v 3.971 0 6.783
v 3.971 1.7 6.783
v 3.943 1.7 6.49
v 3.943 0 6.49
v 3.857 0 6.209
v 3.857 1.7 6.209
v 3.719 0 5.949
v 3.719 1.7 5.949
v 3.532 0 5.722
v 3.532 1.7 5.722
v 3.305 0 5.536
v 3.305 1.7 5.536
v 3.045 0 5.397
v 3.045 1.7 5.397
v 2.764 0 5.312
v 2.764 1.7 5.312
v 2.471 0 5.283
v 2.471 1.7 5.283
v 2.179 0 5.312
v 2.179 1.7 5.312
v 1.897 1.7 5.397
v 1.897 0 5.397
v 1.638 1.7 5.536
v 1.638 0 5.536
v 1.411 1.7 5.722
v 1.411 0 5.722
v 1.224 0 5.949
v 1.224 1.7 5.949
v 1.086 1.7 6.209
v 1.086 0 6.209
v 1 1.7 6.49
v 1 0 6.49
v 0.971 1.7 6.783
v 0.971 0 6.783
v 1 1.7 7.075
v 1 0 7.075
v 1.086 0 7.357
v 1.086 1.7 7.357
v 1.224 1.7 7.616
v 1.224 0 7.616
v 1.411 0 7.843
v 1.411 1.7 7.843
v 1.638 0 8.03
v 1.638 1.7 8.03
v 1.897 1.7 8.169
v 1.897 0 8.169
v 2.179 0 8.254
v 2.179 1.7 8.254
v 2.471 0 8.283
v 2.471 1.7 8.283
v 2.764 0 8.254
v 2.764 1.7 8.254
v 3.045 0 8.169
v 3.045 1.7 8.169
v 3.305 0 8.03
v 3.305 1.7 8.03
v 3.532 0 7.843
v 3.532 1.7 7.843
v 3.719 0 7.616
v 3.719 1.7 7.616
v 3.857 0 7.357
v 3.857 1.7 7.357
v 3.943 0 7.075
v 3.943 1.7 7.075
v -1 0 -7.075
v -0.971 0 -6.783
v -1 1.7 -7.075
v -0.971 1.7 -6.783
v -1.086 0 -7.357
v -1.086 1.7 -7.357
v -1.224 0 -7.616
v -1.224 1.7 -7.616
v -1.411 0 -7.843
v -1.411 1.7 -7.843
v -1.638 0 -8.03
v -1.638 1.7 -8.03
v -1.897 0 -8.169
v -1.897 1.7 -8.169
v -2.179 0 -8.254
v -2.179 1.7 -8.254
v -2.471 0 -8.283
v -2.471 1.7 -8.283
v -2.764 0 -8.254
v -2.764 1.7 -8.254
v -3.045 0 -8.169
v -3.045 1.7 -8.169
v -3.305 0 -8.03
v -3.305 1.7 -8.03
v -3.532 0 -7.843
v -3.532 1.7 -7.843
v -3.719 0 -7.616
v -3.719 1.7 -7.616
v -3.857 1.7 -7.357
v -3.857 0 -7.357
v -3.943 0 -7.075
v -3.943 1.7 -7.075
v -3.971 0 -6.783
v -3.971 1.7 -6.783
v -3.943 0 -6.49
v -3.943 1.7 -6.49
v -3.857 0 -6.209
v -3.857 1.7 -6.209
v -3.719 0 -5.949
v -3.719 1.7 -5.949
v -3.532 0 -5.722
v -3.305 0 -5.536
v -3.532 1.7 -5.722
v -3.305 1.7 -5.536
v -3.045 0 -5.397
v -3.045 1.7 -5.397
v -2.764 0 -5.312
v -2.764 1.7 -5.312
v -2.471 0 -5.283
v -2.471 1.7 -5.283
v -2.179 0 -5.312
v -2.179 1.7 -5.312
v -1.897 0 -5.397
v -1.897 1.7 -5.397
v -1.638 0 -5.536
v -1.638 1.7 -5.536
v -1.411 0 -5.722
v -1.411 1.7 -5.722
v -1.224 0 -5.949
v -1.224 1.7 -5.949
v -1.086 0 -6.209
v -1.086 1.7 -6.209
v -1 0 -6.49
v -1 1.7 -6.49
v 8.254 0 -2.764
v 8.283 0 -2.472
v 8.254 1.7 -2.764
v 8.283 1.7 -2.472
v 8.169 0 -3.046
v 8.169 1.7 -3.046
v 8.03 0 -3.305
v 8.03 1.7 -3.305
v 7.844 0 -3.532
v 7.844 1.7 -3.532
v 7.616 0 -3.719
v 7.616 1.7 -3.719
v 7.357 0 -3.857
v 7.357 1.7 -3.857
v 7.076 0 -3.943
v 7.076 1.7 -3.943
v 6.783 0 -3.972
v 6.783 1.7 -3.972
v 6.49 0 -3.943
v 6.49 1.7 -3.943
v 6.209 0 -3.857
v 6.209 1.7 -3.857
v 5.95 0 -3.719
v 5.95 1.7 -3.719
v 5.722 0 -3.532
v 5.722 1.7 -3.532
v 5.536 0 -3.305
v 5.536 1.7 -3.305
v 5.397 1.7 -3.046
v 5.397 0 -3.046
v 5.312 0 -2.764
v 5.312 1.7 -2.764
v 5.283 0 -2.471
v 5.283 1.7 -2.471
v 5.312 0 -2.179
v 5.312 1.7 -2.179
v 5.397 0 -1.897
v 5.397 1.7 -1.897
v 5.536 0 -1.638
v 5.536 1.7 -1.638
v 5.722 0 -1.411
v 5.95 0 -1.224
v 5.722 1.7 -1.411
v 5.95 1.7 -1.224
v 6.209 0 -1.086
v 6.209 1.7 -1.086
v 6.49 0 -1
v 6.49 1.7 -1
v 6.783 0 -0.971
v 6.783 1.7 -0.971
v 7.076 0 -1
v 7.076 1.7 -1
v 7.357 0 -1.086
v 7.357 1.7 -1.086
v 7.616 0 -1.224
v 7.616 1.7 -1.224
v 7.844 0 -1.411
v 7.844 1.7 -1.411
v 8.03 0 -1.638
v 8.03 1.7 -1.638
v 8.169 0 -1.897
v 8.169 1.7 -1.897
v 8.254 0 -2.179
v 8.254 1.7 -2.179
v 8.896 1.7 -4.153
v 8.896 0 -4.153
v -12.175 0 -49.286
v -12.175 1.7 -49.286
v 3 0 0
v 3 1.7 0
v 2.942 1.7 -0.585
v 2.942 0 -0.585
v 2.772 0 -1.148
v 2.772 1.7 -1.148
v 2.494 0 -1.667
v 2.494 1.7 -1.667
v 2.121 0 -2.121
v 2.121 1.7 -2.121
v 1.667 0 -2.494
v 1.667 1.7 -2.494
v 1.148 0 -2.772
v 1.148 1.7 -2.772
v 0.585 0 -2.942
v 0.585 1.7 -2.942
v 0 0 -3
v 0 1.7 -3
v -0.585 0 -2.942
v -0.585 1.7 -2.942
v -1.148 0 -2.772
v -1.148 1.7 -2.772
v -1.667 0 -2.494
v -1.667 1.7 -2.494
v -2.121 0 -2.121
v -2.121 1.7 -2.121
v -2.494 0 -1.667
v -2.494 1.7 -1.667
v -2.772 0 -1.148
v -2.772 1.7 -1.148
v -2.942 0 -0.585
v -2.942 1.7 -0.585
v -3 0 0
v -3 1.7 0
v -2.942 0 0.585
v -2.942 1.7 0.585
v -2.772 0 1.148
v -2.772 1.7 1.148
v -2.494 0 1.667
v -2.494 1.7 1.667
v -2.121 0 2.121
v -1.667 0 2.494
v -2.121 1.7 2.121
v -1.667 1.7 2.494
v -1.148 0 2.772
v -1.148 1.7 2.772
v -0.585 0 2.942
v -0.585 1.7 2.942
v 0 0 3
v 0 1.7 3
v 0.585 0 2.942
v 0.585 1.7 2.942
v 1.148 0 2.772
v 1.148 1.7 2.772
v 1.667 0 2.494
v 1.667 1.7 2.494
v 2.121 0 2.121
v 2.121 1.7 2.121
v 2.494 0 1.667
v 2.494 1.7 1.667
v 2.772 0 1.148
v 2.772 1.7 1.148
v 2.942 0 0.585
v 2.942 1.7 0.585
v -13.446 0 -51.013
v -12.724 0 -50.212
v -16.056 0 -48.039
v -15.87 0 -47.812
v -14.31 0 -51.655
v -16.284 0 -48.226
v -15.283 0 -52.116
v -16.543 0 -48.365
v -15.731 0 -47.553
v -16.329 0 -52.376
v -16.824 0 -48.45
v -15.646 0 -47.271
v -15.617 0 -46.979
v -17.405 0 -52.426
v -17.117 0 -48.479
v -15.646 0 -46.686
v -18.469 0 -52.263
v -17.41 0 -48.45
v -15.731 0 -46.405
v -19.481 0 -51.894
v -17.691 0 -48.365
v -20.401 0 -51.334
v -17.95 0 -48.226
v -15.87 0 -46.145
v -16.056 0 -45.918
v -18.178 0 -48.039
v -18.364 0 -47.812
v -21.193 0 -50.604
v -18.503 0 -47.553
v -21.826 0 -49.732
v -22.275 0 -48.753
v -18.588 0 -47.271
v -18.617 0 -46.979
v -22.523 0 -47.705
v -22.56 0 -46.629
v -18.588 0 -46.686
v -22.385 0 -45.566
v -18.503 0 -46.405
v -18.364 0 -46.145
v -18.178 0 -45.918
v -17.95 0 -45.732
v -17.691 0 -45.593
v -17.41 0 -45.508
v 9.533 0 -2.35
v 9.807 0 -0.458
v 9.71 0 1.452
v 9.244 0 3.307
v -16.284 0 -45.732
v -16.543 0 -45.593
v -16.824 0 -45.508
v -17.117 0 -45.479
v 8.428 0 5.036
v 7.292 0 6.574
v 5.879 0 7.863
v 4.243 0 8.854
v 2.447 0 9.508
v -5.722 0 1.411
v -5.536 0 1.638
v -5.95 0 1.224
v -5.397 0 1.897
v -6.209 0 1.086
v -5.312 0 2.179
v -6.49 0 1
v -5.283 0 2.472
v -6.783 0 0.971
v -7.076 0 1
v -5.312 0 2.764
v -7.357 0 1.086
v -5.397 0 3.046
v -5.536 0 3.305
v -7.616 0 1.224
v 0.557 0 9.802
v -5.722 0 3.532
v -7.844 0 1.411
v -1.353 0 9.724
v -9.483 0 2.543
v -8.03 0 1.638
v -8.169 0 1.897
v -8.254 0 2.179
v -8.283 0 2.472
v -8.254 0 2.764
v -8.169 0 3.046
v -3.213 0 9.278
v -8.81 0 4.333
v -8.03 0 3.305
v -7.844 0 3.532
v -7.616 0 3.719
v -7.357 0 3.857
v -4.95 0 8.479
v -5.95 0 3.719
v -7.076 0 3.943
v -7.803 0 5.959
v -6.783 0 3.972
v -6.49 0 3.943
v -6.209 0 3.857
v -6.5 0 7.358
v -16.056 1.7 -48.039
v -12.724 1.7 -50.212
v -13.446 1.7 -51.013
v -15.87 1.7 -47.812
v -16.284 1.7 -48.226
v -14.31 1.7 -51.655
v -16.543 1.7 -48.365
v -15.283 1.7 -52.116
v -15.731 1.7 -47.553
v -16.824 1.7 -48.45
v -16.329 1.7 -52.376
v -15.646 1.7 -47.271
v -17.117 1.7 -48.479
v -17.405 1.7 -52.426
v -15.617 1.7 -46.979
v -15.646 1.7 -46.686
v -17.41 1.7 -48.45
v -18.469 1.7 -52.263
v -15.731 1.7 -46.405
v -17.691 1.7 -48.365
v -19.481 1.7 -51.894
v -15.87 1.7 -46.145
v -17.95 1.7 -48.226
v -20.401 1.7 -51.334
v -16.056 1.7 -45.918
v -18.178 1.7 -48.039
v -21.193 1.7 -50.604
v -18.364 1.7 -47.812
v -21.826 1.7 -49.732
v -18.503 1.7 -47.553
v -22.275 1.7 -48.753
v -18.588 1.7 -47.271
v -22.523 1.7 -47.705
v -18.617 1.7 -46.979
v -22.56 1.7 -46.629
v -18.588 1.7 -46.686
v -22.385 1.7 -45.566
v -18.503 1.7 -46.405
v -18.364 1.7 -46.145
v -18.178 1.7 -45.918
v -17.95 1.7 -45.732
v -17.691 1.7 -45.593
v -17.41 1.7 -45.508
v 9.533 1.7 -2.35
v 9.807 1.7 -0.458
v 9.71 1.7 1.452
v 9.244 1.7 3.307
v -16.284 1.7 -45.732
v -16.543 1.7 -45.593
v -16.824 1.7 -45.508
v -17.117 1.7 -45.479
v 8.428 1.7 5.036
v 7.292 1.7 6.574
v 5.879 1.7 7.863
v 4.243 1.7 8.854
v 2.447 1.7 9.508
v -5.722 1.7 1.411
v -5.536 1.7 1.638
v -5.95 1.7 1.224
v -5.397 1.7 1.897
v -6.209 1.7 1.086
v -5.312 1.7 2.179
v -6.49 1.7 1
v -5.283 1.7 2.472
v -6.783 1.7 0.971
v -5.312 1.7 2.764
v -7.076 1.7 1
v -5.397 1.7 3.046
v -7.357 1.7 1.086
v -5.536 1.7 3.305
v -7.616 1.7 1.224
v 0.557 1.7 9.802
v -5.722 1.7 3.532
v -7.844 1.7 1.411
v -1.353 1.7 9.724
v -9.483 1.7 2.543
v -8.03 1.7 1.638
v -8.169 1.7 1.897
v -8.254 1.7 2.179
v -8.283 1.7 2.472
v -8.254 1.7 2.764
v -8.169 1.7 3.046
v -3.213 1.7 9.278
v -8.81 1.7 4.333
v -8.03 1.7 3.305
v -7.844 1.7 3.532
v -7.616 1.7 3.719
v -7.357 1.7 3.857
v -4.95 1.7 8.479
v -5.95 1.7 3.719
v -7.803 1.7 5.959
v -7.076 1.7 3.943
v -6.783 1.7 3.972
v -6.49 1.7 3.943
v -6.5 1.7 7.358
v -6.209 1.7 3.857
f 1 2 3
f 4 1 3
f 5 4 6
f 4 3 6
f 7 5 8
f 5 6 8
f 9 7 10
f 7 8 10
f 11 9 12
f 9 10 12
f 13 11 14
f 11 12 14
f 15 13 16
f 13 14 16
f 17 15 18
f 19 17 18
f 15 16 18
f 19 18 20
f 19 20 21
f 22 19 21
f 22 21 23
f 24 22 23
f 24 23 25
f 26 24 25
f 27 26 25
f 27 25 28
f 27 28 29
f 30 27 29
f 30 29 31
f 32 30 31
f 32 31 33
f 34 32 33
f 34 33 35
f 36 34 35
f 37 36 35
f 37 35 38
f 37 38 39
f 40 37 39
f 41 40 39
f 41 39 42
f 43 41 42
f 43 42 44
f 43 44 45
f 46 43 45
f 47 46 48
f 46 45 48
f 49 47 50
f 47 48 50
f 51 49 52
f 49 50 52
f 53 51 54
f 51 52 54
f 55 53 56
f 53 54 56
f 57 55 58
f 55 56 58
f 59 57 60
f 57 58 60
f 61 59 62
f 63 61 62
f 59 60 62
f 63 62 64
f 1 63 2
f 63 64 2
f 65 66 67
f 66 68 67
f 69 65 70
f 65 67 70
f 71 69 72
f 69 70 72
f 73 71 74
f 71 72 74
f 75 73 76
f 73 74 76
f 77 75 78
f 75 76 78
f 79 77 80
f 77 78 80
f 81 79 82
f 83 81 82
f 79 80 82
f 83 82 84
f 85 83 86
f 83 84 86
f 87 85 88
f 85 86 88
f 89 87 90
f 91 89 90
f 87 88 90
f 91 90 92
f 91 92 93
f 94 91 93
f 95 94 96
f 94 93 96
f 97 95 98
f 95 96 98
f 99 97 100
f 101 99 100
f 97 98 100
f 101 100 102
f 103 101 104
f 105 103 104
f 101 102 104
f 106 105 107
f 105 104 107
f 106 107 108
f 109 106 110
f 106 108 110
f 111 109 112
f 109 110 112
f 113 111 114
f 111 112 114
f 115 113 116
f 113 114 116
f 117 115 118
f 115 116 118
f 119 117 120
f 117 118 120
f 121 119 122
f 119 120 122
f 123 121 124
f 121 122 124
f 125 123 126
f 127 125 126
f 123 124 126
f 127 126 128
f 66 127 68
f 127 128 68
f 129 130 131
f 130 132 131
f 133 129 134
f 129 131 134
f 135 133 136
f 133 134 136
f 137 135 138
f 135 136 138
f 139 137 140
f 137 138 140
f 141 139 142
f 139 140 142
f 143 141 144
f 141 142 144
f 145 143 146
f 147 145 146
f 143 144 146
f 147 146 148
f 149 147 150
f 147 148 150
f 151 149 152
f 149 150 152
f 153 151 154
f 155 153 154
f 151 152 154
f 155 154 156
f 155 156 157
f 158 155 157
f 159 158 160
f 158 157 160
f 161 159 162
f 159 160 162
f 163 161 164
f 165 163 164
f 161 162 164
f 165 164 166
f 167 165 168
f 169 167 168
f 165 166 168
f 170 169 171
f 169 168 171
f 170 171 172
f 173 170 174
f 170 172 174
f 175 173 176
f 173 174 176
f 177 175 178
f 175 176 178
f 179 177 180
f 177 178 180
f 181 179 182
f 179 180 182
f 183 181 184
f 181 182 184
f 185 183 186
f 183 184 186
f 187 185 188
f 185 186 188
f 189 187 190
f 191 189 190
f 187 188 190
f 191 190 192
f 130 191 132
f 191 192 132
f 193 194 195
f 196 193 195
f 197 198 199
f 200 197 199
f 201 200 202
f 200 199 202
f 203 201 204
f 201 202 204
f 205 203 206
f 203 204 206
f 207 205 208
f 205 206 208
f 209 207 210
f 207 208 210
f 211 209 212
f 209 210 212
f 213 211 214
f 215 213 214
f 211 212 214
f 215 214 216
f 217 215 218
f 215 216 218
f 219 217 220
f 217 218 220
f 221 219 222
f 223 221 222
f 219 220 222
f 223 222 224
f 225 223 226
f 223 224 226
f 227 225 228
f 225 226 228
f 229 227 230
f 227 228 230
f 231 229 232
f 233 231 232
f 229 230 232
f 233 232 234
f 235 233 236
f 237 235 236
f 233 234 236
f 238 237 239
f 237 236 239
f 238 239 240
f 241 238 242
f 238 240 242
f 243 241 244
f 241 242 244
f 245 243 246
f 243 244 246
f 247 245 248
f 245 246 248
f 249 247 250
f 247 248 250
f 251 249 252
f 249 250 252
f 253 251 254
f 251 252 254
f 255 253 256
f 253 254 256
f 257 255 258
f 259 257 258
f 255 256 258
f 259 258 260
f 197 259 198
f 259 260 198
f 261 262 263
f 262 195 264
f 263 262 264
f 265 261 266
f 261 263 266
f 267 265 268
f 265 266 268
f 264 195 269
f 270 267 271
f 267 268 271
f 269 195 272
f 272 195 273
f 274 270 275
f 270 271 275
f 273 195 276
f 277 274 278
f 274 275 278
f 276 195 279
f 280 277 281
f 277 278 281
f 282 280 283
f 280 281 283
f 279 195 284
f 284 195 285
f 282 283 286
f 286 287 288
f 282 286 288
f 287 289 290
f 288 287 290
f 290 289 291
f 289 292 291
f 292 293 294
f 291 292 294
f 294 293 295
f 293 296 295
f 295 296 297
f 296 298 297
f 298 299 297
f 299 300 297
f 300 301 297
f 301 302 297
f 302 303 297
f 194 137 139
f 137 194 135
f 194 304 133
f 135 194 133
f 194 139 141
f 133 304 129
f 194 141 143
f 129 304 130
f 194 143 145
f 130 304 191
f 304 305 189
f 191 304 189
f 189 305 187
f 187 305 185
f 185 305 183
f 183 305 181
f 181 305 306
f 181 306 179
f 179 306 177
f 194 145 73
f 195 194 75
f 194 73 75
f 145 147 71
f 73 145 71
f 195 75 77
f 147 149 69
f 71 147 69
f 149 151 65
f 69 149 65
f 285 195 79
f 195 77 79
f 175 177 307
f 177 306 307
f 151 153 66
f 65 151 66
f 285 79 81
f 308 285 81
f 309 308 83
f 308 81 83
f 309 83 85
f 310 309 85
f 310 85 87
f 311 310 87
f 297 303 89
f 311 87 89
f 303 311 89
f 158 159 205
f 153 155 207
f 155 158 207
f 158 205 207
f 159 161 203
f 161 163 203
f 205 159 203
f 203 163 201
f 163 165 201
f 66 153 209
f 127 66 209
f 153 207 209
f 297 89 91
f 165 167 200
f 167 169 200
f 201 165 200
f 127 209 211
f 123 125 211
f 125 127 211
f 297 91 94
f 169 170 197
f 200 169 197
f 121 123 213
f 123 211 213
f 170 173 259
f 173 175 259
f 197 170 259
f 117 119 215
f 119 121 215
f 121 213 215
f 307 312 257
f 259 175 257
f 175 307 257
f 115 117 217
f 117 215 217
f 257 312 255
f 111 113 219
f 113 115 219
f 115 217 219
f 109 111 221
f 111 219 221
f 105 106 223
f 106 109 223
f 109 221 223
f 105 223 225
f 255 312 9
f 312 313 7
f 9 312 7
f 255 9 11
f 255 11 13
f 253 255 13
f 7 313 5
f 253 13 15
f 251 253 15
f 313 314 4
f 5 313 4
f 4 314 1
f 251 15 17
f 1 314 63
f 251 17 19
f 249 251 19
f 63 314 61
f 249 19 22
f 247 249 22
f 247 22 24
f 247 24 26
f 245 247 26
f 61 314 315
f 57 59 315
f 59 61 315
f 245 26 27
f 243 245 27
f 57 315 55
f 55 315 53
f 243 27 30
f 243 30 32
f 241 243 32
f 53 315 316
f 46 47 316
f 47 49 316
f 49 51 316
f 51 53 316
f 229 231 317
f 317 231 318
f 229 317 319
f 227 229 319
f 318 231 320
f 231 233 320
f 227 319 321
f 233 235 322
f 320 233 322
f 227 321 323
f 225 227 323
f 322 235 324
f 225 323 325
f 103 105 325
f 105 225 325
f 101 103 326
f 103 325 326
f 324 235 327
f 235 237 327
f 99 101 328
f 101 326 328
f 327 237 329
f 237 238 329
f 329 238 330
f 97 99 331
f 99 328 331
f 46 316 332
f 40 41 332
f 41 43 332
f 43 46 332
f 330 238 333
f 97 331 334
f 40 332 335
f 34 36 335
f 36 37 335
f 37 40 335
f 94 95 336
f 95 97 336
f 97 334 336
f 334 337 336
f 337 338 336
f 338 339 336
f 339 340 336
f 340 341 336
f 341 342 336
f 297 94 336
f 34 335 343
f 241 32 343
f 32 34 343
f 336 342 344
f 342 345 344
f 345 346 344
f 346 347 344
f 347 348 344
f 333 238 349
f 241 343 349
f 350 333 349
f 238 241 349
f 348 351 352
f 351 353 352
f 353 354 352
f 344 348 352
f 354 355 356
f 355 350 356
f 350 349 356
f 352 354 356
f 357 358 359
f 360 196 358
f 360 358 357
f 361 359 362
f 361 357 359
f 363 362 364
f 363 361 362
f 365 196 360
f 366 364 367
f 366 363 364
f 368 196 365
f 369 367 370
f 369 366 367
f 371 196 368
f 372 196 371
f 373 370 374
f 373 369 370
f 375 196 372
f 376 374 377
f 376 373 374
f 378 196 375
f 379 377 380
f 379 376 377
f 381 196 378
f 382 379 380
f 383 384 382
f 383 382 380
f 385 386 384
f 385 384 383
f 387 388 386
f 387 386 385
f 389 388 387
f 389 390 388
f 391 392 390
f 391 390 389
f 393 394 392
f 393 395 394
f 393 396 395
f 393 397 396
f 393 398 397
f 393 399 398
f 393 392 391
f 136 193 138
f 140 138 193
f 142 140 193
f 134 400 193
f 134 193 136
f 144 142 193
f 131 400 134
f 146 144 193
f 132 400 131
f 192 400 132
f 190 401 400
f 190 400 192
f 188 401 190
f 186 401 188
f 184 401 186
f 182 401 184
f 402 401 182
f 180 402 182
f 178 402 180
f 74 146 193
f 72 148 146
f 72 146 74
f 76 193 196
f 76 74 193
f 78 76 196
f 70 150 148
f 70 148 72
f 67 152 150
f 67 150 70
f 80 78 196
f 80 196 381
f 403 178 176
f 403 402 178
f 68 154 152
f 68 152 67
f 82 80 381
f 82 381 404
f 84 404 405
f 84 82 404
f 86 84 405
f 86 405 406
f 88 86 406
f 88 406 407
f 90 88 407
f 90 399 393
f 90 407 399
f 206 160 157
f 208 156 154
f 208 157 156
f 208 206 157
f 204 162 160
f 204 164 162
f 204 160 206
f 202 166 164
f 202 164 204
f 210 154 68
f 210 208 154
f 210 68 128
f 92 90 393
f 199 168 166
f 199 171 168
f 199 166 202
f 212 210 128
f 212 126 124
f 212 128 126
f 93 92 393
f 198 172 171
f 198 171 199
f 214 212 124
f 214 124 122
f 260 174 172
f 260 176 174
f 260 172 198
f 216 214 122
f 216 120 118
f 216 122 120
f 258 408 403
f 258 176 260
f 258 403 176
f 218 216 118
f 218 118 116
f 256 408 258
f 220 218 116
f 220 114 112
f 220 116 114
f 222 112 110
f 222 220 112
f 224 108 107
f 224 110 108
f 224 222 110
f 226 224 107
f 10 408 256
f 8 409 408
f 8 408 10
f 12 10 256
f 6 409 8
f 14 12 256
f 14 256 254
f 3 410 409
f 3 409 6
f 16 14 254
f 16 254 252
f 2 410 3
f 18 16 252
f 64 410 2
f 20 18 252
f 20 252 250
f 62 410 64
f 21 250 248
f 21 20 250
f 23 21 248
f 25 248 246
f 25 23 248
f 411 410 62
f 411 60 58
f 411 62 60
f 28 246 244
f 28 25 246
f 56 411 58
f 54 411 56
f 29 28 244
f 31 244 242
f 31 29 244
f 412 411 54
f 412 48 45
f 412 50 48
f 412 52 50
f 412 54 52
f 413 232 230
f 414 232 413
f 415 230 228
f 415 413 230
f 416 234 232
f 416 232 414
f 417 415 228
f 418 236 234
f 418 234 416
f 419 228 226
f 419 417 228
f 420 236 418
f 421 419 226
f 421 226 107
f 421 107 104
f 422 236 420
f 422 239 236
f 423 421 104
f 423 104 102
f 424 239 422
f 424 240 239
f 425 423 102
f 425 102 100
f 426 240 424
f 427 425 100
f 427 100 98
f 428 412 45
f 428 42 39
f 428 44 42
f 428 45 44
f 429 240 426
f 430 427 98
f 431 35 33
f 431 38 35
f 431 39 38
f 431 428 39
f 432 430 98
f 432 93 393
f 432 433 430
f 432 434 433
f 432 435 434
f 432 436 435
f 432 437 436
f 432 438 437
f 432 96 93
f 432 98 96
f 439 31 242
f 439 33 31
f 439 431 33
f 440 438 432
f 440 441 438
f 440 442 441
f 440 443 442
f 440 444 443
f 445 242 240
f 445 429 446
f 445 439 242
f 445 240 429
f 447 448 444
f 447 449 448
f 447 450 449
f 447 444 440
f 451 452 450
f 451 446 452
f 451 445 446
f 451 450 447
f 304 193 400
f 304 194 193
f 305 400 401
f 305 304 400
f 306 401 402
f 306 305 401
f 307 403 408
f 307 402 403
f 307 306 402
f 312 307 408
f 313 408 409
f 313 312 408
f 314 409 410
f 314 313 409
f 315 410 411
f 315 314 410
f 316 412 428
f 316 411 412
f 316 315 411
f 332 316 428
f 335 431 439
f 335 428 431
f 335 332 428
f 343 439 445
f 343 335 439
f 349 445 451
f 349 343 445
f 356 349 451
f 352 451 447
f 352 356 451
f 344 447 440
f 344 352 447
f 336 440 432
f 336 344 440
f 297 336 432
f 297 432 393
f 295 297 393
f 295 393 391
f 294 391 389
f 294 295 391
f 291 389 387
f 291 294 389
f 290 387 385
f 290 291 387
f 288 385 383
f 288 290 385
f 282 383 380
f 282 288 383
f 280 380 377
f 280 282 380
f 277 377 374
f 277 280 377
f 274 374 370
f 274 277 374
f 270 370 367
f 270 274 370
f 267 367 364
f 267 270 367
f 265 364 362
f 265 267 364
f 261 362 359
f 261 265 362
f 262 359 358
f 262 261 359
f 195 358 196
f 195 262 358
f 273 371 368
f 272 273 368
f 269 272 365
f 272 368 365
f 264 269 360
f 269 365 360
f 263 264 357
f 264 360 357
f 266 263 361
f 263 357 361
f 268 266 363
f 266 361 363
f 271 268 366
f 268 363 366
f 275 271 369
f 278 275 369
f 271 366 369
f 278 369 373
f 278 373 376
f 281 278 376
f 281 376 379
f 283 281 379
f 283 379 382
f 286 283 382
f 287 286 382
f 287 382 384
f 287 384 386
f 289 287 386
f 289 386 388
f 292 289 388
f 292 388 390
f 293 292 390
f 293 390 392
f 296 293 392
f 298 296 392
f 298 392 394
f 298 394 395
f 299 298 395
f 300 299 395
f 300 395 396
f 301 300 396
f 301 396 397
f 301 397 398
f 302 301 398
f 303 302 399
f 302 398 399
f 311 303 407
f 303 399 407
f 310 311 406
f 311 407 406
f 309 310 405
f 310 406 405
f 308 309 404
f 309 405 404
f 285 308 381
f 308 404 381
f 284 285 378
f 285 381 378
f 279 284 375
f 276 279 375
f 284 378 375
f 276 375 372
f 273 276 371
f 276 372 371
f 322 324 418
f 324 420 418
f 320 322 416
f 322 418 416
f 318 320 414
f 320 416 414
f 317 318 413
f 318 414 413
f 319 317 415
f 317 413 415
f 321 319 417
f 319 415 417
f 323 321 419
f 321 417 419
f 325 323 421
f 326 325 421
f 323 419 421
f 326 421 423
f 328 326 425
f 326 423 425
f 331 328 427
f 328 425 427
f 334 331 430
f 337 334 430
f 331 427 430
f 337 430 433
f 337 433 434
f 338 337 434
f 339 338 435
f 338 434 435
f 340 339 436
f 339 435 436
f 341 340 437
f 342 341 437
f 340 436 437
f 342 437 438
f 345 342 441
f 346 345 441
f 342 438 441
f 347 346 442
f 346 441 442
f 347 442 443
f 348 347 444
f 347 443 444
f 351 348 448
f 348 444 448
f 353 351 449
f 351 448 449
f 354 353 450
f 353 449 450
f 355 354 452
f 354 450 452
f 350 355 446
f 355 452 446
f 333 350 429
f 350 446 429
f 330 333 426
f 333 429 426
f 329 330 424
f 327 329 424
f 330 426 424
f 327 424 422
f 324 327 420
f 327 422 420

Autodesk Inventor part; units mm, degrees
ref_plane "YZ Plane" through (0, 0, 0) normal (1, 0, 0) x (0, 1, 0)
ref_plane "XZ Plane" through (0, 0, 0) normal (0, 1, 0) x (-1, 0, 0)
ref_plane "XY Plane" through (0, 0, 0) normal (0, 0, 1) x (1, 0, 0)
sketch "Sketch1" plane through (0, 0, 0) normal (0, 1, 0) x (-1, 0, 0)
  arc A0 (9.4829, 2.5433) -> (-8.8962, -4.1533) centre (0, 0) ccw
  line L0 (9.4829, 2.5433) -> (22.3854, -45.5658)
  line L1 (-8.8962, -4.1533) -> (12.1747, -49.2862)
  arc A1 (12.1747, -49.2862) -> (22.3854, -45.5658) centre (17.1171, -46.9788) ccw
  dimension "d0" = 19.636
  dimension "d3" = 5.4545
  dimension "d18" = 50
extrude "Extrusion1" add sketch "Sketch1" along normal blind 1.7
sketch "Sketch2" plane through (0, 1.7, 0) normal (0, 1, 0) x (1, 0, 0)
  arc A0 (-12.1747, 49.2862) -> (-22.3854, 45.5658) centre (-17.1171, 46.9788) ccw projected
  arc A1 (-9.4829, -2.5433) -> (8.8962, 4.1533) centre (0, 0) ccw projected
  circle A2 centre (0, 0) radius 1.5
  circle A3 centre (-17.1171, 46.9788) radius 1.5
  circle A4 centre (6.7831, 2.4715) radius 1.5
  circle A5 centre (-6.7831, -2.4715) radius 1.5
  circle A6 centre (-2.4714, 6.7828) radius 1.5
  circle A7 centre (2.4714, -6.7828) radius 1.5
  line L0 (-17.1171, 46.9788) -> (0, 0) construction
  line L1 (-17.1171, 46.9788) -> (-2.4714, 6.7828) construction
  line L2 (0, 0) -> (2.4714, -6.7828) construction
  line L3 (-6.7831, -2.4715) -> (0, 0) construction
  line L4 (0, 0) -> (6.7831, 2.4715) construction
  dimension "d4" = 3
  dimension "d5" = 3
  dimension "d6" = 3
  dimension "d7" = 3
  dimension "d12" = 3
  dimension "d13" = 3
  dimension "d19" = 7.219
  dimension "d20" = 7.2193
  dimension "d21" = 7.2193
  dimension "d22" = 7.219
extrude "Extrusion2" cut sketch "Sketch2" against normal blind 1.7
sketch "Sketch3" plane through (0, 1.7, 0) normal (0, 1, 0) x (1, 0, 0)
  circle A0 centre (0, 0) radius 1.5 projected
  circle A1 centre (0, 0) radius 3
  dimension "d25" = 6
extrude "Extrusion3" cut sketch "Sketch3" against normal through all contours A0 | A1
equation "\"BendRadius\" = Thickness"
equation "\"BendReliefWidth\" = Thickness"
equation "\"BendReliefDepth\" = 0.5 * Thickness"
equation "\"CornerReliefSize\" = 4 * Thickness"
equation "\"MinimumRemnant\" = 2 * Thickness"
equation "\"TransitionRadius\" = BendRadius"
equation "\"JacobiRadiusSize\" = BendRadius"
equation "\"GapSize\" = Thickness"
equation "\"Thickness\" = 3.048"
properties part number "A1P1"
